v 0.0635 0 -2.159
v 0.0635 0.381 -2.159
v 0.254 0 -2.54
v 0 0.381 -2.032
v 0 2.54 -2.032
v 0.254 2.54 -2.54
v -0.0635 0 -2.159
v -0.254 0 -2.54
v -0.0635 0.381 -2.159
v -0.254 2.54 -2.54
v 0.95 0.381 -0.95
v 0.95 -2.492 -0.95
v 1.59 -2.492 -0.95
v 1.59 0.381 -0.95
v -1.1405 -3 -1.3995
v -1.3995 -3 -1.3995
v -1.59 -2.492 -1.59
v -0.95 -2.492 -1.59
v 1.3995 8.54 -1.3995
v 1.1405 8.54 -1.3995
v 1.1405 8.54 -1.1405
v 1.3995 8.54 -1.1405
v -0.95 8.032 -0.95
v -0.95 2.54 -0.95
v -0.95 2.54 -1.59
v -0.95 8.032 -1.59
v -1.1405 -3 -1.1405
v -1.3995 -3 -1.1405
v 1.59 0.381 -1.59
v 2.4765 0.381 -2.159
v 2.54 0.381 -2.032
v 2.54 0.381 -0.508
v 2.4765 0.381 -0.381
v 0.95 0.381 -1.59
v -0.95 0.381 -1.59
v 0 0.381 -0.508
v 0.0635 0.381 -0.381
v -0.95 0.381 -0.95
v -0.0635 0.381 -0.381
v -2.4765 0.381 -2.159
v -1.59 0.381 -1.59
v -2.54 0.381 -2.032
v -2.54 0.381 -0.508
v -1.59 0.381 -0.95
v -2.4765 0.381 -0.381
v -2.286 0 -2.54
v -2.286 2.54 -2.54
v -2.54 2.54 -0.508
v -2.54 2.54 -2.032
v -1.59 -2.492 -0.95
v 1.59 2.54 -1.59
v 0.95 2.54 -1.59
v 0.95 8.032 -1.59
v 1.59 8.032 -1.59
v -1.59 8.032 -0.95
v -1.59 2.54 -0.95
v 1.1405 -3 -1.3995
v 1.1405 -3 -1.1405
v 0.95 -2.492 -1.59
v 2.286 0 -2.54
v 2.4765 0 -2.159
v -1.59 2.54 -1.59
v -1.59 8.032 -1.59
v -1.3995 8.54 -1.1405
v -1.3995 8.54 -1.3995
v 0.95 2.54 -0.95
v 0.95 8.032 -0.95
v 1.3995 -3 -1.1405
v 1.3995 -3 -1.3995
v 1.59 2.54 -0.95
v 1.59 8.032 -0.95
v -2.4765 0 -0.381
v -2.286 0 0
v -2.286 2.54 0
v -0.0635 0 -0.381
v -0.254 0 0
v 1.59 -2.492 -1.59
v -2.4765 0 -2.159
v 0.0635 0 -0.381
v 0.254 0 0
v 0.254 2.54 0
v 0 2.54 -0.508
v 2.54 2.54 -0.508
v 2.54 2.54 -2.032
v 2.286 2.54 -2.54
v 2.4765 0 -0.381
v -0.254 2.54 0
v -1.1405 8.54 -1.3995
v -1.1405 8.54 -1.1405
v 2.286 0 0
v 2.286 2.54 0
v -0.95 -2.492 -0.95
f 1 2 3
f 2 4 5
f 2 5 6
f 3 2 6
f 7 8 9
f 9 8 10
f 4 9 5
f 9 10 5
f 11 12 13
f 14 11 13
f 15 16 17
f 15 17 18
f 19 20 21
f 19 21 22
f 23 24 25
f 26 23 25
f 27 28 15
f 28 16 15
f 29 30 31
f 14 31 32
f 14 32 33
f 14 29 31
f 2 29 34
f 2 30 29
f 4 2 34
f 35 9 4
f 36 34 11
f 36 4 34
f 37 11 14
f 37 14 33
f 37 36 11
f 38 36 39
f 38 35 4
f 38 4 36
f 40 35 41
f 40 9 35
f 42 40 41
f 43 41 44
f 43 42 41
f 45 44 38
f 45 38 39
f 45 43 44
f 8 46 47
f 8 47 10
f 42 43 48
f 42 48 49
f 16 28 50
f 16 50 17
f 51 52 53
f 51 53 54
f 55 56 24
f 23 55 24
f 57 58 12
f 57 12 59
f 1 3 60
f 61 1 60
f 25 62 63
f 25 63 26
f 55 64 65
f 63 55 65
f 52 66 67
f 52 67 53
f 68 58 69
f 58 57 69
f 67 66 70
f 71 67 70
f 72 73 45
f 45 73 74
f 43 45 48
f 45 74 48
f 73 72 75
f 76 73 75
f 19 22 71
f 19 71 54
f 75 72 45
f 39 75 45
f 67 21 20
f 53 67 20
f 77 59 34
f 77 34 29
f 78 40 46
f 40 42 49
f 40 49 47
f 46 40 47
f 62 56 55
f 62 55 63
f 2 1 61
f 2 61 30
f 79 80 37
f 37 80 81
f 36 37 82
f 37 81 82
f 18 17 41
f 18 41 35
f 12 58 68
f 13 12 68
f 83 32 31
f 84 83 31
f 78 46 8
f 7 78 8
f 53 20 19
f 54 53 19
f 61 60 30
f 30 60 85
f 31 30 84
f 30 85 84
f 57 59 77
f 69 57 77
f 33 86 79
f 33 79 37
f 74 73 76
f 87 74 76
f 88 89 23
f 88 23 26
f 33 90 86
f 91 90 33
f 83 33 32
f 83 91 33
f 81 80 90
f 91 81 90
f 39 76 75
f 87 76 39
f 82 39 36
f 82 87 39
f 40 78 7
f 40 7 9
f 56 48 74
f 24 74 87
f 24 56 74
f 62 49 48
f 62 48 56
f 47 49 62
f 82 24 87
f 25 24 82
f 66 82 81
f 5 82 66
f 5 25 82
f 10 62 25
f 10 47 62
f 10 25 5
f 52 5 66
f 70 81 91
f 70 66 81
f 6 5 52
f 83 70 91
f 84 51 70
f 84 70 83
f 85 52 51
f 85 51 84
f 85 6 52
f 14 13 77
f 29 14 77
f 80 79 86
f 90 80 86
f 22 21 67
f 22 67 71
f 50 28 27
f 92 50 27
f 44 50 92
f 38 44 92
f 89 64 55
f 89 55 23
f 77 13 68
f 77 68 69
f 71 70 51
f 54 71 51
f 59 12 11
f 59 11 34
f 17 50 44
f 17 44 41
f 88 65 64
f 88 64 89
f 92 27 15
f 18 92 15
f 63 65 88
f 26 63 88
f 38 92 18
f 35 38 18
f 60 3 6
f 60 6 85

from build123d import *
from OCP.BRepFilletAPI import BRepFilletAPI_MakeChamfer

# Parameters (mm, degrees)
SKETCH1_W                     = 2.54
SKETCH1_H                     = 2.54
MAIN_BODY_DEPTH               = 2.54
SKETCH3_W                     = 1.778
SKETCH3_H                     = 0.381
CUT_EXTRUDE1_DEPTH            = 5.399409051
CUT_EXTRUDE2_DEPTH            = 5.399409051
BODY_PATTERN_COUNT            = 2
BODY_PATTERN_PITCH            = 2.54
PIN_START                     = -5.54
SKETCH2_W                     = 0.64
SKETCH2_H                     = 0.64
PIN_DEPTH                     = 11.54
CHAMFER1_SIZE                 = 0.508
CHAMFER1_SIZE2                = 0.1905
CHAMFER2_SIZE                 = 0.1905
CHAMFER2_SIZE2                = 0.508
PIN_PATTERN_COUNT             = 2
PIN_PATTERN_PITCH             = 2.54
CHAMFER1_OF_PIN_PATTERN_SIZE  = 0.508
CHAMFER1_OF_PIN_PATTERN_SIZE2 = 0.1905
CHAMFER2_OF_PIN_PATTERN_SIZE2 = 0.1905
CHAMFER2_OF_PIN_PATTERN_SIZE  = 0.508


with BuildPart() as part:
    # Sketch1 → Main Body (new body)
    with BuildSketch(Plane(origin=(0, 0, 0), x_dir=(1, 0, 0), z_dir=(0, 1, 0))):
        with Locations((1.27, 1.27)):
            Rectangle(SKETCH1_W, SKETCH1_H)
    main_body = extrude(amount=MAIN_BODY_DEPTH)

    # Sketch3 → Cut-Extrude1 (cut, through all)
    with BuildSketch(Plane.ZY):
        with Locations((-1.27, 0.1905)):
            Rectangle(SKETCH3_W, SKETCH3_H)
    cut_extrude1 = extrude(amount=-CUT_EXTRUDE1_DEPTH, mode=Mode.SUBTRACT)

    # Sketch4 → Cut-Extrude2 (cut, through all)
    with BuildSketch(Plane(origin=(0, 2.54, 0), x_dir=(1, 0, 0), z_dir=(0, 1, 0))):
        Polygon((0.254, 2.54), (0, 2.54), (0, 2.032), align=None)
        Polygon((2.54, 2.54), (2.286, 2.54), (2.54, 2.032), align=None)
        Polygon((0.254, 0), (0, 0.508), (0, 0), align=None)
        Polygon((2.54, 0), (2.286, 0), (2.54, 0.508), align=None)
    cut_extrude2 = extrude(amount=-CUT_EXTRUDE2_DEPTH, mode=Mode.SUBTRACT)

    # Body Pattern: Main Body, Cut-Extrude1, Cut-Extrude2 ×2
    with Locations(*[(-i * BODY_PATTERN_PITCH, 0, 0) for i in range(1, BODY_PATTERN_COUNT)]):
        add(main_body)
        add(cut_extrude1, mode=Mode.SUBTRACT)
        add(cut_extrude2, mode=Mode.SUBTRACT)

    # Sketch2 → Pin (add)
    with BuildSketch(Plane(origin=(0, 2.54, 0), x_dir=(1, 0, 0), z_dir=(0, 1, 0)).offset(PIN_START)):
        with Locations((1.27, 1.27)):
            Rectangle(SKETCH2_W, SKETCH2_H)
    pin = extrude(amount=PIN_DEPTH)

    # Chamfer1: one chamfer whose edges measure the first distance from different faces: ONE call of the kernel's chamfer builder (chamfer() names one face for all edges)
    chamfer1_edges_1 = [part.edges().sort_by_distance(p)[0] for p in [
        (0.95, 8.54, -1.27),
    ]]
    chamfer1_side_1 = [part.faces().sort_by_distance(p)[0] for p in [
        (0.95, 5.54, -1.27),
    ]]
    chamfer1_edges_2 = [part.edges().sort_by_distance(p)[0] for p in [
        (1.27, 8.54, -0.95),
    ]]
    chamfer1_side_2 = [part.faces().sort_by_distance(p)[0] for p in [
        (1.27, 5.54, -0.95),
    ]]
    chamfer1_edges_3 = [part.edges().sort_by_distance(p)[0] for p in [
        (1.59, 8.54, -1.27),
    ]]
    chamfer1_side_3 = [part.faces().sort_by_distance(p)[0] for p in [
        (1.59, 5.54, -1.27),
    ]]
    chamfer1_edges_4 = [part.edges().sort_by_distance(p)[0] for p in [
        (1.27, 8.54, -1.59),
    ]]
    chamfer1_side_4 = [part.faces().sort_by_distance(p)[0] for p in [
        (1.27, 5.54, -1.59),
    ]]
    chamfer1 = BRepFilletAPI_MakeChamfer(part.part.solid().wrapped)
    for e in chamfer1_edges_1:
        chamfer1.Add(CHAMFER1_SIZE, CHAMFER1_SIZE2, e.wrapped, chamfer1_side_1[0].wrapped)  # the first distance lies on this face
    for e in chamfer1_edges_2:
        chamfer1.Add(CHAMFER1_SIZE, CHAMFER1_SIZE2, e.wrapped, chamfer1_side_2[0].wrapped)  # the first distance lies on this face
    for e in chamfer1_edges_3:
        chamfer1.Add(CHAMFER1_SIZE, CHAMFER1_SIZE2, e.wrapped, chamfer1_side_3[0].wrapped)  # the first distance lies on this face
    for e in chamfer1_edges_4:
        chamfer1.Add(CHAMFER1_SIZE, CHAMFER1_SIZE2, e.wrapped, chamfer1_side_4[0].wrapped)  # the first distance lies on this face
    add(Compound.cast(chamfer1.Shape()), mode=Mode.REPLACE)

    # Chamfer2
    chamfer2_edges = [part.edges().sort_by_distance(p)[0] for p in [
        (1.27, -3, -0.95),
        (1.59, -3, -1.27),
        (1.27, -3, -1.59),
        (0.95, -3, -1.27),
    ]]
    chamfer2_side = [part.faces().sort_by_distance(p)[0] for p in [
        (1.27, -3, -1.27),
    ]]
    chamfer(chamfer2_edges, length=CHAMFER2_SIZE, length2=CHAMFER2_SIZE2, reference=chamfer2_side[0])

    # Pin Pattern: Pin ×2
    with Locations(*[(-i * PIN_PATTERN_PITCH, 0, 0) for i in range(1, PIN_PATTERN_COUNT)]):
        add(pin)

    # Chamfer1 of Pin Pattern: one chamfer whose edges measure the first distance from different faces: ONE call of the kernel's chamfer builder (chamfer() names one face for all edges)
    chamfer1_of_pin_pattern_edges_1 = [part.edges().sort_by_distance(p)[0] for p in [
        (-1.59, 8.54, -1.27),
    ]]
    chamfer1_of_pin_pattern_side_1 = [part.faces().sort_by_distance(p)[0] for p in [
        (-1.59, 5.54, -1.27),
    ]]
    chamfer1_of_pin_pattern_edges_2 = [part.edges().sort_by_distance(p)[0] for p in [
        (-1.27, 8.54, -0.95),
    ]]
    chamfer1_of_pin_pattern_side_2 = [part.faces().sort_by_distance(p)[0] for p in [
        (-1.27, 5.54, -0.95),
    ]]
    chamfer1_of_pin_pattern_edges_3 = [part.edges().sort_by_distance(p)[0] for p in [
        (-0.95, 8.54, -1.27),
    ]]
    chamfer1_of_pin_pattern_side_3 = [part.faces().sort_by_distance(p)[0] for p in [
        (-0.95, 5.54, -1.27),
    ]]
    chamfer1_of_pin_pattern_edges_4 = [part.edges().sort_by_distance(p)[0] for p in [
        (-1.27, 8.54, -1.59),
    ]]
    chamfer1_of_pin_pattern_side_4 = [part.faces().sort_by_distance(p)[0] for p in [
        (-1.27, 5.54, -1.59),
    ]]
    chamfer1_of_pin_pattern = BRepFilletAPI_MakeChamfer(part.part.solid().wrapped)
    for e in chamfer1_of_pin_pattern_edges_1:
        chamfer1_of_pin_pattern.Add(CHAMFER1_OF_PIN_PATTERN_SIZE, CHAMFER1_OF_PIN_PATTERN_SIZE2, e.wrapped, chamfer1_of_pin_pattern_side_1[0].wrapped)  # the first distance lies on this face
    for e in chamfer1_of_pin_pattern_edges_2:
        chamfer1_of_pin_pattern.Add(CHAMFER1_OF_PIN_PATTERN_SIZE, CHAMFER1_OF_PIN_PATTERN_SIZE2, e.wrapped, chamfer1_of_pin_pattern_side_2[0].wrapped)  # the first distance lies on this face
    for e in chamfer1_of_pin_pattern_edges_3:
        chamfer1_of_pin_pattern.Add(CHAMFER1_OF_PIN_PATTERN_SIZE, CHAMFER1_OF_PIN_PATTERN_SIZE2, e.wrapped, chamfer1_of_pin_pattern_side_3[0].wrapped)  # the first distance lies on this face
    for e in chamfer1_of_pin_pattern_edges_4:
        chamfer1_of_pin_pattern.Add(CHAMFER1_OF_PIN_PATTERN_SIZE, CHAMFER1_OF_PIN_PATTERN_SIZE2, e.wrapped, chamfer1_of_pin_pattern_side_4[0].wrapped)  # the first distance lies on this face
    add(Compound.cast(chamfer1_of_pin_pattern.Shape()), mode=Mode.REPLACE)

    # Chamfer2 of Pin Pattern
    chamfer2_of_pin_pattern_edges = [part.edges().sort_by_distance(p)[0] for p in [
        (-1.27, -3, -0.95),
        (-0.95, -3, -1.27),
        (-1.27, -3, -1.59),
        (-1.59, -3, -1.27),
    ]]
    chamfer(chamfer2_of_pin_pattern_edges, length=CHAMFER2_OF_PIN_PATTERN_SIZE, length2=CHAMFER2_OF_PIN_PATTERN_SIZE2)


solid = part.part
